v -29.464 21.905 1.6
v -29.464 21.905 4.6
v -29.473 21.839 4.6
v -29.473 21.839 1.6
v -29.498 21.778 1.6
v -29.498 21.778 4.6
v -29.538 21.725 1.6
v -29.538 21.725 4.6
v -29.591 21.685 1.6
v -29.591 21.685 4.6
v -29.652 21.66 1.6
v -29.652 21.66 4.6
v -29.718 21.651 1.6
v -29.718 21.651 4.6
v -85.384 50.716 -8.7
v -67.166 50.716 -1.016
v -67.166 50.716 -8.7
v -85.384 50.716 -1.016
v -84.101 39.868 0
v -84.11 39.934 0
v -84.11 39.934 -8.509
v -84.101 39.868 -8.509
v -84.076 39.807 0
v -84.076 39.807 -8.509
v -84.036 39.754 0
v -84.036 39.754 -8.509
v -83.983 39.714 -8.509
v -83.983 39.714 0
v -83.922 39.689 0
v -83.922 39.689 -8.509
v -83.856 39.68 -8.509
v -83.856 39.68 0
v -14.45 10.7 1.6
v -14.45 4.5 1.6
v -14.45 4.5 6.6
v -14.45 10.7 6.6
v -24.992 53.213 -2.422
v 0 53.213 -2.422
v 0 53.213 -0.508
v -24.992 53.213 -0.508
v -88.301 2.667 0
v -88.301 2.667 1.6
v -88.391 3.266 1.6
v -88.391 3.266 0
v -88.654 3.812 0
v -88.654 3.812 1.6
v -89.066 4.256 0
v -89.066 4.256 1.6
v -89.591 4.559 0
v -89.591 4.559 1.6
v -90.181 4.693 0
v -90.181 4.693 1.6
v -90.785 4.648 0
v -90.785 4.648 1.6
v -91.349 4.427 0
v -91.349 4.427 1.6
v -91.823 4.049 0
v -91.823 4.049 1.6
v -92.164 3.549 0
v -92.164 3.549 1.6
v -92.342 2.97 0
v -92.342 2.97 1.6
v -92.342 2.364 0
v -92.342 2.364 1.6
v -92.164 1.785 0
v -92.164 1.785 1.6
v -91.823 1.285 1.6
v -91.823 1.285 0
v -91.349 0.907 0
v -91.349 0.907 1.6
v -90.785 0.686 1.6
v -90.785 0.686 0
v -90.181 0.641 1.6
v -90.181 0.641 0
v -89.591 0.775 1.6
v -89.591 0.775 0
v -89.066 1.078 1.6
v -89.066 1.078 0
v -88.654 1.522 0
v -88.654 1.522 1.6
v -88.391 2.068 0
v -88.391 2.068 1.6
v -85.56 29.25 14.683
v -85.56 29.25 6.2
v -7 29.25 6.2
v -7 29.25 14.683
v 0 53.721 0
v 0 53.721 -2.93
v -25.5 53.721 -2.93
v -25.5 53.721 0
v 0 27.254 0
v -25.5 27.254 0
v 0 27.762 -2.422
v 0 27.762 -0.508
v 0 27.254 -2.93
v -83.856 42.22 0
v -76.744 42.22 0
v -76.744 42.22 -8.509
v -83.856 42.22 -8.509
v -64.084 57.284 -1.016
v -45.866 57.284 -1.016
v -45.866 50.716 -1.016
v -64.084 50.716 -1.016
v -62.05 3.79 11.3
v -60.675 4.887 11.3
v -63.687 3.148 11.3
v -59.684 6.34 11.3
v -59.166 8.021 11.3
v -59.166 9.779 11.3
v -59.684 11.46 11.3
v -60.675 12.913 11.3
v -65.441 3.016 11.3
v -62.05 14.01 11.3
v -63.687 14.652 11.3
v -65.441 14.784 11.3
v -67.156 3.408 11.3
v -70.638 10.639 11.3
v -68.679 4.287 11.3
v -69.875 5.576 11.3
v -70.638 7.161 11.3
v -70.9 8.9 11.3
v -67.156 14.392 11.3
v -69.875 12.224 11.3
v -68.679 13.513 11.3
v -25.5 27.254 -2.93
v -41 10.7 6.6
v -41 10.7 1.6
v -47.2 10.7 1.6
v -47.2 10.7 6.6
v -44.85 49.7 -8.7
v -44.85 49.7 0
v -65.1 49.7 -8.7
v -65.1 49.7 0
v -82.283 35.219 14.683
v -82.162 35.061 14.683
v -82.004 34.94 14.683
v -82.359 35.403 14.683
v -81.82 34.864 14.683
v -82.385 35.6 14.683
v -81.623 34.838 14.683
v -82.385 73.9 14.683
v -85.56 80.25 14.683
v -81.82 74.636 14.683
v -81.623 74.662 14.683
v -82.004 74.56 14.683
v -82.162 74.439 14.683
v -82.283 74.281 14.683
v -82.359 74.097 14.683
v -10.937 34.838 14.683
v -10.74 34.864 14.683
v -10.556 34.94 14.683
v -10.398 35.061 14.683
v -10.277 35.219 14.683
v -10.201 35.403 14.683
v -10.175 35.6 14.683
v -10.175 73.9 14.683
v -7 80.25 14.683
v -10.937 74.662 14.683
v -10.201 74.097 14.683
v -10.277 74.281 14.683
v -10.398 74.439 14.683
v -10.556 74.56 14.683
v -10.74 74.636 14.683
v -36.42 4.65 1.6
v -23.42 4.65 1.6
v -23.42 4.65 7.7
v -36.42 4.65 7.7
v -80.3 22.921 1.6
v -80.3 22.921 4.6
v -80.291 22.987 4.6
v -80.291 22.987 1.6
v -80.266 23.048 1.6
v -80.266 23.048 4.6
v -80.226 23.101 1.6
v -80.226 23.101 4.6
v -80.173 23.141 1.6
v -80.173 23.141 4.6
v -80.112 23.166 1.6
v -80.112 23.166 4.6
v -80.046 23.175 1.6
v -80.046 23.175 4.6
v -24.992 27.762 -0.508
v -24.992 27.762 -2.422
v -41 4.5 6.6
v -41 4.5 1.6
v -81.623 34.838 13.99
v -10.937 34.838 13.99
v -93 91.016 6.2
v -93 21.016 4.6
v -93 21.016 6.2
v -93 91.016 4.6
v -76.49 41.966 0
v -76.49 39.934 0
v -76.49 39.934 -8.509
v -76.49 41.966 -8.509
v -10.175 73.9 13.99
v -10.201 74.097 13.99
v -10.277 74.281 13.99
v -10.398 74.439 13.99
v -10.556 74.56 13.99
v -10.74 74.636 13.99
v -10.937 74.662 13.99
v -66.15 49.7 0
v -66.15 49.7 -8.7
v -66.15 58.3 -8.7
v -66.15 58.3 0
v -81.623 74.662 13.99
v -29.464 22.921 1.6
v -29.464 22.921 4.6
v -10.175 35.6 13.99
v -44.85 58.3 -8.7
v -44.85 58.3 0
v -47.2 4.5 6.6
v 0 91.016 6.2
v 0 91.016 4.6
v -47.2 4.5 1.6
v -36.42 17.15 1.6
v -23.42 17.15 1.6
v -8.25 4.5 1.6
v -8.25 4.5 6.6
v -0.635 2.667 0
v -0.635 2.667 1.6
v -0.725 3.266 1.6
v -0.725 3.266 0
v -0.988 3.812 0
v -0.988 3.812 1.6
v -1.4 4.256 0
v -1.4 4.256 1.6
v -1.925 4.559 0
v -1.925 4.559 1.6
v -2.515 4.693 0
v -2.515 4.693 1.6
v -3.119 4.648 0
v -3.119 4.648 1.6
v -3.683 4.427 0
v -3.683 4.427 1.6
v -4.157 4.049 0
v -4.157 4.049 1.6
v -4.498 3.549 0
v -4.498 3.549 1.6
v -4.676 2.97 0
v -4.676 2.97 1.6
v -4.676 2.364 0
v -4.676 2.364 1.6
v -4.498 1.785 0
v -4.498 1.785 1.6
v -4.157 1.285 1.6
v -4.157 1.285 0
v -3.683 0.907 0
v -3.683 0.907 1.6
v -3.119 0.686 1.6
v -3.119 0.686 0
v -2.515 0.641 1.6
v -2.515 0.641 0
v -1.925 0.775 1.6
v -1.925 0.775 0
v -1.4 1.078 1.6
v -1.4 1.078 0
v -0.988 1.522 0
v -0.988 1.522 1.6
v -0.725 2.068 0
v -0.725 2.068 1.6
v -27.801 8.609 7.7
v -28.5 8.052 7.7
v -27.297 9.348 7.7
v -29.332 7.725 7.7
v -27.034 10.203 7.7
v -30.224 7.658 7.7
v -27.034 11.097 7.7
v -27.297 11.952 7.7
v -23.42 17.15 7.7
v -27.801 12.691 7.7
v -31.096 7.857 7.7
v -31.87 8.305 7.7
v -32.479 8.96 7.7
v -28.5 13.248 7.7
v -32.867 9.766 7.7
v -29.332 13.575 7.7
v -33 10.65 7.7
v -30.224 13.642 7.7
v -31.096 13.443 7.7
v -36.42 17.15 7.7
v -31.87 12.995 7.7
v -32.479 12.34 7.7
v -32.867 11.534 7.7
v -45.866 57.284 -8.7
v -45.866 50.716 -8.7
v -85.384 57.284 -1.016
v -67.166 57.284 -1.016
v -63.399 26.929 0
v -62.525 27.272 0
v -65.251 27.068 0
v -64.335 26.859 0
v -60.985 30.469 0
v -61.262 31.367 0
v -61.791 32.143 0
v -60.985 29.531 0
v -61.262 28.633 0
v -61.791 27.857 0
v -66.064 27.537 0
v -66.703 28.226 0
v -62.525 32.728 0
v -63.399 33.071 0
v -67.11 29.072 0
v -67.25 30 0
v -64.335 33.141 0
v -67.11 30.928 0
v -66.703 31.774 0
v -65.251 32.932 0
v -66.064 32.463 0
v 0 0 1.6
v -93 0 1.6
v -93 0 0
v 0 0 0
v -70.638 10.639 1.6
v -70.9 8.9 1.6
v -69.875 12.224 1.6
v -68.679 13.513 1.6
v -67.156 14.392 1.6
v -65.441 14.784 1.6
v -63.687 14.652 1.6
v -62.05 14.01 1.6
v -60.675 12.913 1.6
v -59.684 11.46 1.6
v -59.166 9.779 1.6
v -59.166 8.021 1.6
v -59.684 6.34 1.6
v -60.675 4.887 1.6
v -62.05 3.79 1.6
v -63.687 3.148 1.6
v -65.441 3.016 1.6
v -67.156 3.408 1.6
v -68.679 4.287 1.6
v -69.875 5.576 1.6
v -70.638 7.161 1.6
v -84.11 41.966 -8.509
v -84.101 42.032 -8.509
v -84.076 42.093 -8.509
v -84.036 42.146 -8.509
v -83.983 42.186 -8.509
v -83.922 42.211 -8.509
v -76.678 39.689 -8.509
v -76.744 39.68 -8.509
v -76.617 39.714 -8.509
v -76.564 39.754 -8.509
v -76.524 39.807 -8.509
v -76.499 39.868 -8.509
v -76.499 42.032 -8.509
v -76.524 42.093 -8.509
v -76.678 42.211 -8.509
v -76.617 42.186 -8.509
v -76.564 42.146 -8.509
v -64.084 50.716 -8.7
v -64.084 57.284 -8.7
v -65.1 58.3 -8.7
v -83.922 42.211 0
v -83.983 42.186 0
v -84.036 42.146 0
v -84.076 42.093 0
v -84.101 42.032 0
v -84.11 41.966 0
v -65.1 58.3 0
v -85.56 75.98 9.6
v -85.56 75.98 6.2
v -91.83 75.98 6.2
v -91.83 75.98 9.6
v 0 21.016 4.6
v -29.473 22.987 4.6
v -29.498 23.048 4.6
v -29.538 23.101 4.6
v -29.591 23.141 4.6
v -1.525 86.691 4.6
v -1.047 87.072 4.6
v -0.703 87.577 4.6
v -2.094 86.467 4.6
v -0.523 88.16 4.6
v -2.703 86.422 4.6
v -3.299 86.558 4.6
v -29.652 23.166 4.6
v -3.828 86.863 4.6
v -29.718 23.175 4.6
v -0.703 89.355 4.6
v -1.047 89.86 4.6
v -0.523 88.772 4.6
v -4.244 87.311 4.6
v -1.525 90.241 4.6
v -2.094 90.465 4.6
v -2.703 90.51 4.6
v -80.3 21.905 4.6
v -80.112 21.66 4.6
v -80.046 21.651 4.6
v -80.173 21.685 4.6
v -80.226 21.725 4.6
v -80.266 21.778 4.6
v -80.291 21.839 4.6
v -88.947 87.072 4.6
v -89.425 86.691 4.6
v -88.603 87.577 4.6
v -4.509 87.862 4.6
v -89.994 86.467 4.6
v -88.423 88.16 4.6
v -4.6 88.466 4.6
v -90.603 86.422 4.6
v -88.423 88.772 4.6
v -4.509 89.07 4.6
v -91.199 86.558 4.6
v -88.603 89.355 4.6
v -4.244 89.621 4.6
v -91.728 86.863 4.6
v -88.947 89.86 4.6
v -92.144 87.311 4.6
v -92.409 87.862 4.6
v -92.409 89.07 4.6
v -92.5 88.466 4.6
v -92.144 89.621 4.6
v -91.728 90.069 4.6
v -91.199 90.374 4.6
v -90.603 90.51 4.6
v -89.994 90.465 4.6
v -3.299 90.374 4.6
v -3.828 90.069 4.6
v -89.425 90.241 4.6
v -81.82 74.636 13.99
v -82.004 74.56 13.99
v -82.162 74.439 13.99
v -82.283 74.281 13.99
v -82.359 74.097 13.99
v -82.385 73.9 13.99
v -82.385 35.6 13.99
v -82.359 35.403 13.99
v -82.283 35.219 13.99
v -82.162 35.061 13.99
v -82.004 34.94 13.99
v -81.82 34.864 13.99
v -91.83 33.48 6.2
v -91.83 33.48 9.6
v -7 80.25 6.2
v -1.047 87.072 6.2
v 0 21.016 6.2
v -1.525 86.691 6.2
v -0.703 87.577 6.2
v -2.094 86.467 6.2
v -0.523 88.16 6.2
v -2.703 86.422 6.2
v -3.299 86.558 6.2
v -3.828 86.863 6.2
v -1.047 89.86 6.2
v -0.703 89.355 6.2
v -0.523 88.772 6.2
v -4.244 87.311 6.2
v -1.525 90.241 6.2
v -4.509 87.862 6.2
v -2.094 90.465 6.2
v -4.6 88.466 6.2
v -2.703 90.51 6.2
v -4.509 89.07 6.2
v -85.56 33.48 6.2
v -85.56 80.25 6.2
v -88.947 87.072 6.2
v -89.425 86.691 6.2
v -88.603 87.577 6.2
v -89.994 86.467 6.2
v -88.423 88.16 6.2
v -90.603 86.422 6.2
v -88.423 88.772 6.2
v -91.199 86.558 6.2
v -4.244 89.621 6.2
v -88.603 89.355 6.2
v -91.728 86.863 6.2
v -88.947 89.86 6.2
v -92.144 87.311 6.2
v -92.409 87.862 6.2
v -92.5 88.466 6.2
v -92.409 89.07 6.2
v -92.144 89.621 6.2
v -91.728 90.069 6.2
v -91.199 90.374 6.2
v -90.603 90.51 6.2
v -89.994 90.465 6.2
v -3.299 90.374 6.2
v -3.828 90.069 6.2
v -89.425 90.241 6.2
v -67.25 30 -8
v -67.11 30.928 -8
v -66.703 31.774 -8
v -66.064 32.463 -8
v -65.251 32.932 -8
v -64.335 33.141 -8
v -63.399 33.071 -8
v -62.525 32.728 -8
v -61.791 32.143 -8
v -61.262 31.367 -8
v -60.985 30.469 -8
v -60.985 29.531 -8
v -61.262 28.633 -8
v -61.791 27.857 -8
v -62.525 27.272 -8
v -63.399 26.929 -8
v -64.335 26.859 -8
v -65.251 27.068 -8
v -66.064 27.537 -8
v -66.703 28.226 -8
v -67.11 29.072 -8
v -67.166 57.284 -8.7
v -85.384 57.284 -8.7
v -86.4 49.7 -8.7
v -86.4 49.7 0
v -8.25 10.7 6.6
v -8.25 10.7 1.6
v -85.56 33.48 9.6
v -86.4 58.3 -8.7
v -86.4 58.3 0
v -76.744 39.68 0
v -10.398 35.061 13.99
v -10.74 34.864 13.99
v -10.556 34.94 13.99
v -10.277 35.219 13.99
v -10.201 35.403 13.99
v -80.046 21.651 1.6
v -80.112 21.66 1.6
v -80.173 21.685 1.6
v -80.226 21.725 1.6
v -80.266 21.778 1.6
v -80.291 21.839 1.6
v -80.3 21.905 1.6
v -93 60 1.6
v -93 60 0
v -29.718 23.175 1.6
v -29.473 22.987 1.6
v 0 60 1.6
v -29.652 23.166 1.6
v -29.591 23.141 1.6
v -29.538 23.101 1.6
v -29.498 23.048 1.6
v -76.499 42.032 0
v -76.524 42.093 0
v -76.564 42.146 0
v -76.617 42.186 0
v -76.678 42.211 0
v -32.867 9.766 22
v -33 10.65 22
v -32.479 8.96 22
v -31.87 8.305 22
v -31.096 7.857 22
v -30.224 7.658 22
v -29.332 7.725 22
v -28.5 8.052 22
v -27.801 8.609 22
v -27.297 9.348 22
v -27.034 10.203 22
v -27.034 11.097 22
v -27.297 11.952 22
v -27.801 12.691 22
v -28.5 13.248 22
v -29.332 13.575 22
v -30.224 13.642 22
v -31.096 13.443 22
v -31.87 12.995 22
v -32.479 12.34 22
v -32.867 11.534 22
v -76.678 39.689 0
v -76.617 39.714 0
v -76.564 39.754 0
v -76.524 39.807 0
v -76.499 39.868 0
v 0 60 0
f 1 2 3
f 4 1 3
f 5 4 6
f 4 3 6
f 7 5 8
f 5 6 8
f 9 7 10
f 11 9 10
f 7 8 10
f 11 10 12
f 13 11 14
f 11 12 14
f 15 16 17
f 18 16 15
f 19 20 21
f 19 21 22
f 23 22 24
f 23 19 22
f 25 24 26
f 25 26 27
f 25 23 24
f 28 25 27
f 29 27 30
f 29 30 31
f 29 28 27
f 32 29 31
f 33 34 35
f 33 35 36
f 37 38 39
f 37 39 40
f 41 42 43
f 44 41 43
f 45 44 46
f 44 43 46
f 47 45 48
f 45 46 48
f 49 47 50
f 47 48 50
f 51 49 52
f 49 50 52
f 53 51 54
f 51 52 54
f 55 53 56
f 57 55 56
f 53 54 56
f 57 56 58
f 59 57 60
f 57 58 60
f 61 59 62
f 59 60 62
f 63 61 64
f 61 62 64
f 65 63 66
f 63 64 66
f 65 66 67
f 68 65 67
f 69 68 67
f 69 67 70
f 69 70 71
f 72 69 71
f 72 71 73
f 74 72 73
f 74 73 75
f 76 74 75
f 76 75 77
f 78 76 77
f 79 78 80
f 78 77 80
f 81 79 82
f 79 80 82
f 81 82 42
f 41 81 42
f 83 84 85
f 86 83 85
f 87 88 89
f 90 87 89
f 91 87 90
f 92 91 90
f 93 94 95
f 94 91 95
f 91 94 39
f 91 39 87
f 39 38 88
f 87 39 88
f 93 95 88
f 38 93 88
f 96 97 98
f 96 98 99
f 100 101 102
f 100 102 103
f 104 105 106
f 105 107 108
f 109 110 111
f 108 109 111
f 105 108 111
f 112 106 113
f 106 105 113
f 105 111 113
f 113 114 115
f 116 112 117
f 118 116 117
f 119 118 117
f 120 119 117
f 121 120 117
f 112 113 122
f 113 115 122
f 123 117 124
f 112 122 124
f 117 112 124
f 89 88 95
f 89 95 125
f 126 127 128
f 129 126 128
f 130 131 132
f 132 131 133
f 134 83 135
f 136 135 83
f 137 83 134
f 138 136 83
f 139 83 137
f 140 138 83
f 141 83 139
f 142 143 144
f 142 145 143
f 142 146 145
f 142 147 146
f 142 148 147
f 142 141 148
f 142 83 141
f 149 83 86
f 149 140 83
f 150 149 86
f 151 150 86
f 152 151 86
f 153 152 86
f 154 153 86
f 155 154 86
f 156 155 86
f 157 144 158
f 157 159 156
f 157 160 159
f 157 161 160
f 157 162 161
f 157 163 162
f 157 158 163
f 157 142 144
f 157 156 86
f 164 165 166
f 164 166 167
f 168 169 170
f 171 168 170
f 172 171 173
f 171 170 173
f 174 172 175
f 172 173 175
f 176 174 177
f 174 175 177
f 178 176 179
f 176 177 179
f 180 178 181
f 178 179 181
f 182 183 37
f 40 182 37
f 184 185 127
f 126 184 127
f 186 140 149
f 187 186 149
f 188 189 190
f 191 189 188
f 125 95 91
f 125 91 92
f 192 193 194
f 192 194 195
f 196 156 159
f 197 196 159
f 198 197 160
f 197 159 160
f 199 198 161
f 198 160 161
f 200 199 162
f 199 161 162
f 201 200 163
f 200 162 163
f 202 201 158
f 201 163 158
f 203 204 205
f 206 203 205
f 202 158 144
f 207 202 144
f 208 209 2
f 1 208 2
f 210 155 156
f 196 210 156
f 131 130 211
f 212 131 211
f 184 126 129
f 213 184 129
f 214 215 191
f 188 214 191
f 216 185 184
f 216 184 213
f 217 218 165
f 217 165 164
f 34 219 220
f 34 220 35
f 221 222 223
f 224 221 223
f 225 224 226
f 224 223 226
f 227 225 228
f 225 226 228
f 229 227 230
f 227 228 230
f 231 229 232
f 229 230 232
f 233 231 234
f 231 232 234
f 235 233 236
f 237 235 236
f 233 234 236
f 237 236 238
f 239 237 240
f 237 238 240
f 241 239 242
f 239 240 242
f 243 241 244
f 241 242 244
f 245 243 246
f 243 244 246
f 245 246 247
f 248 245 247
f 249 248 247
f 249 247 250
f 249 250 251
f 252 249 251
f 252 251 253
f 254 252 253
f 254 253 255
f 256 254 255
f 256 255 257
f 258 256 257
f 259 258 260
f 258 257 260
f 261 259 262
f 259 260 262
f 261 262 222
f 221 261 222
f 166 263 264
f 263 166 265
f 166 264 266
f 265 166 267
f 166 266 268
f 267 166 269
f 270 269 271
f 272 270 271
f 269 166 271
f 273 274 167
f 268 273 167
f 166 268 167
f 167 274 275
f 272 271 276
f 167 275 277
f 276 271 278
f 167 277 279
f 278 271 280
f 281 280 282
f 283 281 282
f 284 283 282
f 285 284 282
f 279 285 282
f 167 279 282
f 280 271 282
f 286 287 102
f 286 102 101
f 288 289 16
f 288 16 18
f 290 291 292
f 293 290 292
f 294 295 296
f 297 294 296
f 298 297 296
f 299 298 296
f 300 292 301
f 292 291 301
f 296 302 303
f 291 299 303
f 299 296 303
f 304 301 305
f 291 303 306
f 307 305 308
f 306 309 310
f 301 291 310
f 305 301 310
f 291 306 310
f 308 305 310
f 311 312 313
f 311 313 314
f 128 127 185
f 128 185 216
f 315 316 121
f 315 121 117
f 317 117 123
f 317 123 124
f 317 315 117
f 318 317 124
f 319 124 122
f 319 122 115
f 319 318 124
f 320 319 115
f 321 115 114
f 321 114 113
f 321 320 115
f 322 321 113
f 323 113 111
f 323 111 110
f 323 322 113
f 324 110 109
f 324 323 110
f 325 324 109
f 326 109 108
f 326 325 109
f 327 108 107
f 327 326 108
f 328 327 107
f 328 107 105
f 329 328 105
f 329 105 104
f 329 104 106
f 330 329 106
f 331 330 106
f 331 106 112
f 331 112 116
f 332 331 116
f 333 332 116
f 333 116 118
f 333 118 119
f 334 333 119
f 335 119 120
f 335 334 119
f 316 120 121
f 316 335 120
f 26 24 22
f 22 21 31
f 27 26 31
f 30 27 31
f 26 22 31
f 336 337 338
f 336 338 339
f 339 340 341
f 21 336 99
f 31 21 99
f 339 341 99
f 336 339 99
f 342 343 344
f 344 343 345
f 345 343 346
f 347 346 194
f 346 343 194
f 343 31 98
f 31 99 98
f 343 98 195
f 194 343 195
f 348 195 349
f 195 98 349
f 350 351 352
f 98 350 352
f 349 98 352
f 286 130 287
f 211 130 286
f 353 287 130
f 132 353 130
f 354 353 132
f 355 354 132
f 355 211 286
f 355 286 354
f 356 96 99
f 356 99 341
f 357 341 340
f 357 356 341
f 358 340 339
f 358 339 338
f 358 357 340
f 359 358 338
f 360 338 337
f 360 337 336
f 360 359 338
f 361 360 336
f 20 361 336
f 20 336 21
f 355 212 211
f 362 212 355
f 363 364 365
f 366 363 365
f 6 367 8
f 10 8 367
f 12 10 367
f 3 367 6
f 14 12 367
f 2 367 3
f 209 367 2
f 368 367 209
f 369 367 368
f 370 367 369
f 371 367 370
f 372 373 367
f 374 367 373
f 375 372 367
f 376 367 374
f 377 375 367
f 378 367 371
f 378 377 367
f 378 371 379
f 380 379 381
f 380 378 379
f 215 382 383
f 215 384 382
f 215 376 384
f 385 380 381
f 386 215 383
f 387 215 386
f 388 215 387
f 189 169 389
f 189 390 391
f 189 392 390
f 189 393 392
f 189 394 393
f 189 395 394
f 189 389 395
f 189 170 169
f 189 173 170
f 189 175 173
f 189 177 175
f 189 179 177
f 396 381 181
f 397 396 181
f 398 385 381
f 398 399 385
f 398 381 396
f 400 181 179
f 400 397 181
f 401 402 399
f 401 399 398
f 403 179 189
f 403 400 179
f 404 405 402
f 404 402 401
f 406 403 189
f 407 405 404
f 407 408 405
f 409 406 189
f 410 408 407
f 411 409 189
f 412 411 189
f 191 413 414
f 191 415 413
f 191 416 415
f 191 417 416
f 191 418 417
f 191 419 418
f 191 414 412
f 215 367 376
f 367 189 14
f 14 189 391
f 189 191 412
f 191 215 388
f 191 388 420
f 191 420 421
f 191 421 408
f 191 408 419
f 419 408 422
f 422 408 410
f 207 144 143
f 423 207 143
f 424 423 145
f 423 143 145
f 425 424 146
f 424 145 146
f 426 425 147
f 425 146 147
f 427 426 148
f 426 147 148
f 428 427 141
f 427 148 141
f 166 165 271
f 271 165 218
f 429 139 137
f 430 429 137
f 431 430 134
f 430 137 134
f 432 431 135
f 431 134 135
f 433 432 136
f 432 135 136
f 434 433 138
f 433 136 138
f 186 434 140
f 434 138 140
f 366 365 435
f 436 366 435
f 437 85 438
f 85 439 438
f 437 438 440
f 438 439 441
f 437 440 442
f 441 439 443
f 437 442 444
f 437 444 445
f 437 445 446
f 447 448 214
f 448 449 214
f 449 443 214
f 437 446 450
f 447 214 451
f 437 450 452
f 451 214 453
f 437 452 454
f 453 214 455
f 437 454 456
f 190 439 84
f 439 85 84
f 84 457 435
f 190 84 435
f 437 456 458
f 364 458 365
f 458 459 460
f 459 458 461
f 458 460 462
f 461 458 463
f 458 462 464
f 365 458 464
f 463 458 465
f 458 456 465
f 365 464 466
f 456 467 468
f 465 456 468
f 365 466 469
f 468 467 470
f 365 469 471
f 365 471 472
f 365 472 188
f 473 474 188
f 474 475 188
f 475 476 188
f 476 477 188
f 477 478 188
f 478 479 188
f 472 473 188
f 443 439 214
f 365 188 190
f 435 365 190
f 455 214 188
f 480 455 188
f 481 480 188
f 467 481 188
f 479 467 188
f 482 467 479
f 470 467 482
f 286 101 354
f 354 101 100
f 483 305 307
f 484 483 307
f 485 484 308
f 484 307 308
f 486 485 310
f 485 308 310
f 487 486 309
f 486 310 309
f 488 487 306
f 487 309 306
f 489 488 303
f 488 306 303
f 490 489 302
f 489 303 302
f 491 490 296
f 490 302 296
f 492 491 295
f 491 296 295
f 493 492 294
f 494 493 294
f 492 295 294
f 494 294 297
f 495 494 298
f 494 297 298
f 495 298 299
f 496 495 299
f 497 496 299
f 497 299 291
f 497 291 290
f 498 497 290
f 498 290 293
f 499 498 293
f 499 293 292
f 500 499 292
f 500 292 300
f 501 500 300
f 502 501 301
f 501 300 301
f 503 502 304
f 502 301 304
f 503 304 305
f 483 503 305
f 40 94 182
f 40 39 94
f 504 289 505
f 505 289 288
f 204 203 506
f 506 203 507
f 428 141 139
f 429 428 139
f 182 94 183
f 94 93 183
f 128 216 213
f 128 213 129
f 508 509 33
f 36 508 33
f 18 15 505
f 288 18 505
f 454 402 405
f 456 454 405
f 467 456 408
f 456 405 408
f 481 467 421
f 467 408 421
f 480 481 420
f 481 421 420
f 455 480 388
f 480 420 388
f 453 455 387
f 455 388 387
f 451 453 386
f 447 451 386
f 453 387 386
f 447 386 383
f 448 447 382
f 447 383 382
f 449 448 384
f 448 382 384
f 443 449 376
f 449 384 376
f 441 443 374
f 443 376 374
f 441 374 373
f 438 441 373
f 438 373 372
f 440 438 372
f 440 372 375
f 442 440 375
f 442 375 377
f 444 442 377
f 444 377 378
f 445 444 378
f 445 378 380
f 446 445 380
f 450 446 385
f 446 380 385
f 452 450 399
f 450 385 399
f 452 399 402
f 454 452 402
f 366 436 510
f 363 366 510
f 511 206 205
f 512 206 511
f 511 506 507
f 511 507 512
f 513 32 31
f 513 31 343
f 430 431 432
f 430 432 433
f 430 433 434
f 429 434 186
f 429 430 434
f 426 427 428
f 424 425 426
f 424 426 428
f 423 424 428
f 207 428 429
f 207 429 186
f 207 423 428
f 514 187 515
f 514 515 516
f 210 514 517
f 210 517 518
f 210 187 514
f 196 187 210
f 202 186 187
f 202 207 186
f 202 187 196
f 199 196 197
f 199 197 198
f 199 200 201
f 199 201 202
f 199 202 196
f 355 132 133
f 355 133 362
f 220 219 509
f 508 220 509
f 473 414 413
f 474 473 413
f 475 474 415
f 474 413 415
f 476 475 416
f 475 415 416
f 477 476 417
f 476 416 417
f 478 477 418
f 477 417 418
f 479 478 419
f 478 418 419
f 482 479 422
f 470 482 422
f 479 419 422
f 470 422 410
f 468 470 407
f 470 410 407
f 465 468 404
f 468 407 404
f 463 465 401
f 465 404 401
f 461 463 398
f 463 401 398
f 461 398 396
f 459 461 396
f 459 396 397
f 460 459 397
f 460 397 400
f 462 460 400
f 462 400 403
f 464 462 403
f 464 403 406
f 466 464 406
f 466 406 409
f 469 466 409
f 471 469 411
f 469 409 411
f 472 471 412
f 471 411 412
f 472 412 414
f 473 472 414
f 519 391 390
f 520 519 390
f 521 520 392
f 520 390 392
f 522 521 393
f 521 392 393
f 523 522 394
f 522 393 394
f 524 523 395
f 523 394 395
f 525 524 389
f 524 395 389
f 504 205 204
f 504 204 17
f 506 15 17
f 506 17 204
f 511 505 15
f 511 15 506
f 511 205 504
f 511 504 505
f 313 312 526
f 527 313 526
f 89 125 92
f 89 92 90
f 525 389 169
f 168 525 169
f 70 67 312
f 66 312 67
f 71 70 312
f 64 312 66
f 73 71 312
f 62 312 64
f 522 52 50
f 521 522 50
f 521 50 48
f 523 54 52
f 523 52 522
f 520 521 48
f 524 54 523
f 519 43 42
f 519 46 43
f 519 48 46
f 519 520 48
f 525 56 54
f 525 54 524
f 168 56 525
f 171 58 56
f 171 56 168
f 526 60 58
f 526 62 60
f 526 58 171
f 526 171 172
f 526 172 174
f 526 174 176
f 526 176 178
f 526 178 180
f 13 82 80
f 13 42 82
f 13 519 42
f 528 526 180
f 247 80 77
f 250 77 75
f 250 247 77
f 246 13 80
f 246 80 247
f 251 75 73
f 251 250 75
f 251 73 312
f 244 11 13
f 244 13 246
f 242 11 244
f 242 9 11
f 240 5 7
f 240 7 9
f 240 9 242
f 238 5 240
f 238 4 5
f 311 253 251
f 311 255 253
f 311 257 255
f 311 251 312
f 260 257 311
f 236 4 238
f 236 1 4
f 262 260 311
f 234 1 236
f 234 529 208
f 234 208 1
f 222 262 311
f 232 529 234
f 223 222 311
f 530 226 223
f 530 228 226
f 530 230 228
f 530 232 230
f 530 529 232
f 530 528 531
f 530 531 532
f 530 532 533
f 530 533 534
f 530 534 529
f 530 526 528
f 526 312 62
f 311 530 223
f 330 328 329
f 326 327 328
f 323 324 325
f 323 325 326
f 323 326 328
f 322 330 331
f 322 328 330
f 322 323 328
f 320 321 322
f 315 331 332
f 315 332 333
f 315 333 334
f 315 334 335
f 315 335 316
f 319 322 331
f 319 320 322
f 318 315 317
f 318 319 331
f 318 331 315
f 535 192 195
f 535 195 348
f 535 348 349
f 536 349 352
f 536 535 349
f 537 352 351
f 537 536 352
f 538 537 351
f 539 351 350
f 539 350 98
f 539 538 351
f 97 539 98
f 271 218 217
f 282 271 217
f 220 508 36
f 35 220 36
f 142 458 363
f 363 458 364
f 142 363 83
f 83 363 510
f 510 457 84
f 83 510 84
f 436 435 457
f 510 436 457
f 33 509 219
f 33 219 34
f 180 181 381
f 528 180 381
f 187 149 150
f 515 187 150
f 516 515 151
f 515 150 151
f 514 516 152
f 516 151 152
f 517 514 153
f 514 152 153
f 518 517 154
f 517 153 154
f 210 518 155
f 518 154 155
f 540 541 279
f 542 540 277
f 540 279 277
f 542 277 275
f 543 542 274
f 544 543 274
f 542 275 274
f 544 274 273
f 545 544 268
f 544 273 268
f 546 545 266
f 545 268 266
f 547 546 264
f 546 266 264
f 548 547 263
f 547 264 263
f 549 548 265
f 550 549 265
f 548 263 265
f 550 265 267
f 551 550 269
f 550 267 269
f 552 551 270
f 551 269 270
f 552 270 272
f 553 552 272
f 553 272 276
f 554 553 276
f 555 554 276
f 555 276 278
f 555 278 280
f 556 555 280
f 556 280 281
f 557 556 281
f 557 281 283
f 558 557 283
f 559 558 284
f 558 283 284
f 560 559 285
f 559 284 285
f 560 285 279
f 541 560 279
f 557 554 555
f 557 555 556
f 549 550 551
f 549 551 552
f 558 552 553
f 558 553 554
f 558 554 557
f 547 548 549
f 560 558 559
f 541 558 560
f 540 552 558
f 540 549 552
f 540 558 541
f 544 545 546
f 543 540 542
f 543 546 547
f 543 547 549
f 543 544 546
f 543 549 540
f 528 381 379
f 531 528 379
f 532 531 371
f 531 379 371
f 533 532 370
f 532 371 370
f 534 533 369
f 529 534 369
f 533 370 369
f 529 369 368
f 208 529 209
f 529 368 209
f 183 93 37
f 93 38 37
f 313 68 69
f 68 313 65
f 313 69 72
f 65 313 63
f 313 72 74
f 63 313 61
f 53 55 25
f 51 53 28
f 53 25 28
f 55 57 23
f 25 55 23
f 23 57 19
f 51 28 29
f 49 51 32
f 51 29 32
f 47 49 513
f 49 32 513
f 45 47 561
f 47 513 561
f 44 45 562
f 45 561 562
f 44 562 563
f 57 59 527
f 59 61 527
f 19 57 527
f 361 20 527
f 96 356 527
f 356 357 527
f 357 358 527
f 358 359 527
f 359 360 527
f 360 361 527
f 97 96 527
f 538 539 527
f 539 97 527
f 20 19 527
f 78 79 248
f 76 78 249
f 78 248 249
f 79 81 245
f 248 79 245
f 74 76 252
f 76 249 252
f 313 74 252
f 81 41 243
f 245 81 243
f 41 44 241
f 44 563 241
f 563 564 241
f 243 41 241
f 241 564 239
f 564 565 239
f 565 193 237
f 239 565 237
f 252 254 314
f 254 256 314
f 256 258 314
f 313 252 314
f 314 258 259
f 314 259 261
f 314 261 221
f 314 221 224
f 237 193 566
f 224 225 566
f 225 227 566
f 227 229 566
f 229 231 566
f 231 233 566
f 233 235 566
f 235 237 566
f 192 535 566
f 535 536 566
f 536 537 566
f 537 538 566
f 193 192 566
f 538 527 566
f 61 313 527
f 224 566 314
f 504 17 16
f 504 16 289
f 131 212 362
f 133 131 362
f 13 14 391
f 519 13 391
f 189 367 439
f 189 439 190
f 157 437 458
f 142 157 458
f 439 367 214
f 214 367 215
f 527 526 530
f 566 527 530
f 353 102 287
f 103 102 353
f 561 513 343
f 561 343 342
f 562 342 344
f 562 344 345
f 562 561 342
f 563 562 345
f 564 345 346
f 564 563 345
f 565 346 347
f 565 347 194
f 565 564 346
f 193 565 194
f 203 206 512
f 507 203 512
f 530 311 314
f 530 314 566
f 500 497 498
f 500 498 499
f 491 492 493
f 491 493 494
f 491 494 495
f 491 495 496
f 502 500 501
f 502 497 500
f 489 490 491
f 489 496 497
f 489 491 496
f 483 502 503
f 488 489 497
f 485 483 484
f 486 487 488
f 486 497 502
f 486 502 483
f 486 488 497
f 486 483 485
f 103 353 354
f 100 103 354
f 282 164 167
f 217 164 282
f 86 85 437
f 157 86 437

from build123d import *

# Parameters (mm, degrees)
SKETCH6_W            = 93
SKETCH6_H            = 70
SKETCH6_R            = 2.05
GREEN_PCB_DEPTH      = 1.6
SKETCH57_W           = 93
SKETCH57_H           = 60
SKETCH57_R           = 2.032
WHITE_PCB_DEPTH      = 1.6
JUMPER_DEPTH         = 8.509
LCD_PINS_DEPTH       = 3
LCD_BASE_DEPTH       = 3.4
SKETCH109_W          = 78.56
SKETCH109_H          = 51
LCD_SCREEN_DEPTH     = 5.083556
LCD_GLASS_DEPTH      = 0.762
SKETCH17_W           = 25.5
SKETCH17_H           = 26.4668
SD_CARD_DEPTH        = 2.93
SKETCH24_W           = 6.2
SKETCH24_H           = 6.2
STOP_DEPTH           = 5
SKETCH32_W           = 6.2
SKETCH32_H           = 6.2
LIGHT_DEPTH          = 5
SKETCH40_W           = 13
SKETCH40_H           = 12.5
SELECTOR_DEPTH       = 6.1
SKETCH41_R           = 3
SELECTOR_SHAFT_DEPTH = 14.3
SKETCH49_R           = 5.9
SPEAKER_DEPTH        = 9.7
SKETCH77_R           = 3.15
CAPACITOR_DEPTH      = 8
SKETCH78_W           = 20.25
SKETCH78_H           = 8.6
EPX1_DEPTH           = 8.7
SKETCH88_W           = 20.25
SKETCH88_H           = 8.6
EXP2_DEPTH           = 8.7
SHELL2_T             = -0.508
SHELL3_T             = -1.016
SHELL4_T             = -1.016


with BuildPart() as part:
    # Sketch6 → Green PCB (new body)
    with BuildSketch(Plane(origin=(0, 0, 4.6), x_dir=(-1, 0, 0), z_dir=(0, 0, -1))):
        with Locations((46.5, 56.016)):
            Rectangle(SKETCH6_W, SKETCH6_H)
        with Locations((90.45, 88.466)):
            Circle(SKETCH6_R, mode=Mode.SUBTRACT)
        with Locations((2.55, 88.466)):
            Circle(SKETCH6_R, mode=Mode.SUBTRACT)
    extrude(amount=-GREEN_PCB_DEPTH)



with BuildPart() as body_2:
    # Sketch57 → White PCB (new body)
    with BuildSketch(Plane.XY.offset(1.6)):
        with Locations((-46.5, 30)):
            Rectangle(SKETCH57_W, SKETCH57_H)
        with Locations((-2.667, 2.667)):
            Circle(SKETCH57_R, mode=Mode.SUBTRACT)
        with Locations((-90.333, 2.667)):
            Circle(SKETCH57_R, mode=Mode.SUBTRACT)
    extrude(amount=-WHITE_PCB_DEPTH)

    # Sketch122 → Jumper (add)
    with BuildSketch(Plane.XY):
        with BuildLine():
            Line((-84.11, 41.966), (-84.11, 39.934))
            ThreePointArc((-84.11, 39.934), (-84.035605122, 39.754394878), (-83.856, 39.68))
            Line((-83.856, 39.68), (-76.744, 39.68))
            ThreePointArc((-76.744, 39.68), (-76.564394878, 39.754394878), (-76.49, 39.934))
            Line((-76.49, 39.934), (-76.49, 41.966))
            ThreePointArc((-76.49, 41.966), (-76.564394878, 42.145605122), (-76.744, 42.22))
            Line((-76.744, 42.22), (-83.856, 42.22))
            ThreePointArc((-83.856, 42.22), (-84.035605122, 42.145605122), (-84.11, 41.966))
        make_face()
    extrude(amount=-JUMPER_DEPTH)


with BuildPart() as part_1:
    add(part.part)

    add(body_2.part)  # LCD Pins merges body 2
    # Sketch123 → LCD Pins (add)
    with BuildSketch(Plane(origin=(0, 0, 4.6), x_dir=(-1, 0, 0), z_dir=(0, 0, -1))):
        with BuildLine():
            Line((80.3, 21.905), (80.3, 22.921))
            ThreePointArc((80.3, 22.921), (80.225605122, 23.100605122), (80.046, 23.175))
            Line((80.046, 23.175), (29.718, 23.175))
            ThreePointArc((29.718, 23.175), (29.538394878, 23.100605122), (29.464, 22.921))
            Line((29.464, 22.921), (29.464, 21.905))
            ThreePointArc((29.464, 21.905), (29.538394878, 21.725394878), (29.718, 21.651))
            Line((29.718, 21.651), (80.046, 21.651))
            ThreePointArc((80.046, 21.651), (80.225605122, 21.725394878), (80.3, 21.905))
        make_face()
    extrude(amount=LCD_PINS_DEPTH)

    # Sketch98 → LCD Base (add)
    with BuildSketch(Plane.XY.offset(6.2)):
        Polygon((-85.56, 75.98), (-91.83, 75.98), (-91.83, 33.48), (-85.56, 33.48), (-85.56, 29.25), (-7, 29.25), (-7, 80.25), (-85.56, 80.25), align=None)
    extrude(amount=LCD_BASE_DEPTH)

    # Sketch109 → LCD Screen (add)
    with BuildSketch(Plane.XY.offset(9.59993)):
        with Locations((-46.28, 54.75)):
            Rectangle(SKETCH109_W, SKETCH109_H)
    extrude(amount=LCD_SCREEN_DEPTH)

    # Sketch121 → LCD Glass (cut)
    with BuildSketch(Plane.XY.offset(14.752066)):
        with BuildLine():
            Line((-82.385, 73.9), (-82.385, 35.6))
            ThreePointArc((-82.385, 35.6), (-82.161815367, 35.061184633), (-81.623, 34.838))
            Line((-81.623, 34.838), (-10.937, 34.838))
            ThreePointArc((-10.937, 34.838), (-10.398184633, 35.061184633), (-10.175, 35.6))
            Line((-10.175, 35.6), (-10.175, 73.9))
            ThreePointArc((-10.175, 73.9), (-10.398184633, 74.438815367), (-10.937, 74.662))
            Line((-10.937, 74.662), (-81.623, 74.662))
            ThreePointArc((-81.623, 74.662), (-82.161815367, 74.438815367), (-82.385, 73.9))
        make_face()
    extrude(amount=-LCD_GLASS_DEPTH, mode=Mode.SUBTRACT)


with BuildPart() as body_2_2:
    # Sketch17 → SD Card (new body)
    with BuildSketch(Plane(origin=(0, 0, -2.93), x_dir=(-1, 0, 0), z_dir=(0, 0, -1))):
        with Locations((12.75, 40.4876)):
            Rectangle(SKETCH17_W, SKETCH17_H)
    extrude(amount=-SD_CARD_DEPTH)

    # Shell2
    shell2_openings = [body_2_2.faces().sort_by_distance(p)[0] for p in [
        (0, 40.4876, -1.465),
    ]]
    offset(amount=SHELL2_T, openings=shell2_openings, kind=Kind.INTERSECTION)


with BuildPart() as body_3:
    # Sketch24 → Stop (new body)
    with BuildSketch(Plane(origin=(0, 0, 1.6), x_dir=(-1, 0, 0), z_dir=(0, 0, -1))):
        with Locations((44.1, 7.6)):
            Rectangle(SKETCH24_W, SKETCH24_H)
    extrude(amount=-STOP_DEPTH)


with BuildPart() as body_4:
    # Sketch32 → Light (new body)
    with BuildSketch(Plane(origin=(0, 0, 1.6), x_dir=(-1, 0, 0), z_dir=(0, 0, -1))):
        with Locations((11.35, 7.6)):
            Rectangle(SKETCH32_W, SKETCH32_H)
    extrude(amount=-LIGHT_DEPTH)


with BuildPart() as body_5:
    # Sketch40 → Selector (new body)
    with BuildSketch(Plane(origin=(0, 0, 1.6), x_dir=(-1, 0, 0), z_dir=(0, 0, -1))):
        with Locations((29.92, 10.9)):
            Rectangle(SKETCH40_W, SKETCH40_H)
    extrude(amount=-SELECTOR_DEPTH)

    # Sketch41 → Selector Shaft (add)
    with BuildSketch(Plane.XY.offset(7.7)):
        with Locations(Location((-30, 10.65, 0), (0, 0, 180))):
            Circle(SKETCH41_R)
    extrude(amount=SELECTOR_SHAFT_DEPTH)


with BuildPart() as body_6:
    # Sketch49 → Speaker (new body)
    with BuildSketch(Plane(origin=(0, 0, 1.6), x_dir=(-1, 0, 0), z_dir=(0, 0, -1))):
        with Locations((65, 8.9)):
            Circle(SKETCH49_R)
    extrude(amount=-SPEAKER_DEPTH)


with BuildPart() as body_7:
    # Sketch77 → Capacitor (new body)
    with BuildSketch(Plane(origin=(0, 0, 0), x_dir=(-1, 0, 0), z_dir=(0, 0, -1))):
        with Locations((64.1, 30)):
            Circle(SKETCH77_R)
    extrude(amount=CAPACITOR_DEPTH)


with BuildPart() as body_8:
    # Sketch78 → EPX1 (new body)
    with BuildSketch(Plane(origin=(0, 0, 0), x_dir=(-1, 0, 0), z_dir=(0, 0, -1))):
        with Locations((76.275, 54)):
            Rectangle(SKETCH78_W, SKETCH78_H)
    extrude(amount=EPX1_DEPTH)

    # Shell4
    shell4_openings = [body_8.faces().sort_by_distance(p)[0] for p in [
        (-76.275, 54, -8.7),
    ]]
    offset(amount=SHELL4_T, openings=shell4_openings, kind=Kind.INTERSECTION)


with BuildPart() as body_9:
    # Sketch88 → Exp2 (new body)
    with BuildSketch(Plane(origin=(0, 0, 0), x_dir=(-1, 0, 0), z_dir=(0, 0, -1))):
        with Locations((54.975, 54)):
            Rectangle(SKETCH88_W, SKETCH88_H)
    extrude(amount=EXP2_DEPTH)

    # Shell3
    shell3_openings = [body_9.faces().sort_by_distance(p)[0] for p in [
        (-54.975, 54, -8.7),
    ]]
    offset(amount=SHELL3_T, openings=shell3_openings, kind=Kind.INTERSECTION)


solid = Compound([part_1.part, body_2_2.part, body_3.part, body_4.part, body_5.part, body_6.part, body_7.part, body_8.part, body_9.part])
